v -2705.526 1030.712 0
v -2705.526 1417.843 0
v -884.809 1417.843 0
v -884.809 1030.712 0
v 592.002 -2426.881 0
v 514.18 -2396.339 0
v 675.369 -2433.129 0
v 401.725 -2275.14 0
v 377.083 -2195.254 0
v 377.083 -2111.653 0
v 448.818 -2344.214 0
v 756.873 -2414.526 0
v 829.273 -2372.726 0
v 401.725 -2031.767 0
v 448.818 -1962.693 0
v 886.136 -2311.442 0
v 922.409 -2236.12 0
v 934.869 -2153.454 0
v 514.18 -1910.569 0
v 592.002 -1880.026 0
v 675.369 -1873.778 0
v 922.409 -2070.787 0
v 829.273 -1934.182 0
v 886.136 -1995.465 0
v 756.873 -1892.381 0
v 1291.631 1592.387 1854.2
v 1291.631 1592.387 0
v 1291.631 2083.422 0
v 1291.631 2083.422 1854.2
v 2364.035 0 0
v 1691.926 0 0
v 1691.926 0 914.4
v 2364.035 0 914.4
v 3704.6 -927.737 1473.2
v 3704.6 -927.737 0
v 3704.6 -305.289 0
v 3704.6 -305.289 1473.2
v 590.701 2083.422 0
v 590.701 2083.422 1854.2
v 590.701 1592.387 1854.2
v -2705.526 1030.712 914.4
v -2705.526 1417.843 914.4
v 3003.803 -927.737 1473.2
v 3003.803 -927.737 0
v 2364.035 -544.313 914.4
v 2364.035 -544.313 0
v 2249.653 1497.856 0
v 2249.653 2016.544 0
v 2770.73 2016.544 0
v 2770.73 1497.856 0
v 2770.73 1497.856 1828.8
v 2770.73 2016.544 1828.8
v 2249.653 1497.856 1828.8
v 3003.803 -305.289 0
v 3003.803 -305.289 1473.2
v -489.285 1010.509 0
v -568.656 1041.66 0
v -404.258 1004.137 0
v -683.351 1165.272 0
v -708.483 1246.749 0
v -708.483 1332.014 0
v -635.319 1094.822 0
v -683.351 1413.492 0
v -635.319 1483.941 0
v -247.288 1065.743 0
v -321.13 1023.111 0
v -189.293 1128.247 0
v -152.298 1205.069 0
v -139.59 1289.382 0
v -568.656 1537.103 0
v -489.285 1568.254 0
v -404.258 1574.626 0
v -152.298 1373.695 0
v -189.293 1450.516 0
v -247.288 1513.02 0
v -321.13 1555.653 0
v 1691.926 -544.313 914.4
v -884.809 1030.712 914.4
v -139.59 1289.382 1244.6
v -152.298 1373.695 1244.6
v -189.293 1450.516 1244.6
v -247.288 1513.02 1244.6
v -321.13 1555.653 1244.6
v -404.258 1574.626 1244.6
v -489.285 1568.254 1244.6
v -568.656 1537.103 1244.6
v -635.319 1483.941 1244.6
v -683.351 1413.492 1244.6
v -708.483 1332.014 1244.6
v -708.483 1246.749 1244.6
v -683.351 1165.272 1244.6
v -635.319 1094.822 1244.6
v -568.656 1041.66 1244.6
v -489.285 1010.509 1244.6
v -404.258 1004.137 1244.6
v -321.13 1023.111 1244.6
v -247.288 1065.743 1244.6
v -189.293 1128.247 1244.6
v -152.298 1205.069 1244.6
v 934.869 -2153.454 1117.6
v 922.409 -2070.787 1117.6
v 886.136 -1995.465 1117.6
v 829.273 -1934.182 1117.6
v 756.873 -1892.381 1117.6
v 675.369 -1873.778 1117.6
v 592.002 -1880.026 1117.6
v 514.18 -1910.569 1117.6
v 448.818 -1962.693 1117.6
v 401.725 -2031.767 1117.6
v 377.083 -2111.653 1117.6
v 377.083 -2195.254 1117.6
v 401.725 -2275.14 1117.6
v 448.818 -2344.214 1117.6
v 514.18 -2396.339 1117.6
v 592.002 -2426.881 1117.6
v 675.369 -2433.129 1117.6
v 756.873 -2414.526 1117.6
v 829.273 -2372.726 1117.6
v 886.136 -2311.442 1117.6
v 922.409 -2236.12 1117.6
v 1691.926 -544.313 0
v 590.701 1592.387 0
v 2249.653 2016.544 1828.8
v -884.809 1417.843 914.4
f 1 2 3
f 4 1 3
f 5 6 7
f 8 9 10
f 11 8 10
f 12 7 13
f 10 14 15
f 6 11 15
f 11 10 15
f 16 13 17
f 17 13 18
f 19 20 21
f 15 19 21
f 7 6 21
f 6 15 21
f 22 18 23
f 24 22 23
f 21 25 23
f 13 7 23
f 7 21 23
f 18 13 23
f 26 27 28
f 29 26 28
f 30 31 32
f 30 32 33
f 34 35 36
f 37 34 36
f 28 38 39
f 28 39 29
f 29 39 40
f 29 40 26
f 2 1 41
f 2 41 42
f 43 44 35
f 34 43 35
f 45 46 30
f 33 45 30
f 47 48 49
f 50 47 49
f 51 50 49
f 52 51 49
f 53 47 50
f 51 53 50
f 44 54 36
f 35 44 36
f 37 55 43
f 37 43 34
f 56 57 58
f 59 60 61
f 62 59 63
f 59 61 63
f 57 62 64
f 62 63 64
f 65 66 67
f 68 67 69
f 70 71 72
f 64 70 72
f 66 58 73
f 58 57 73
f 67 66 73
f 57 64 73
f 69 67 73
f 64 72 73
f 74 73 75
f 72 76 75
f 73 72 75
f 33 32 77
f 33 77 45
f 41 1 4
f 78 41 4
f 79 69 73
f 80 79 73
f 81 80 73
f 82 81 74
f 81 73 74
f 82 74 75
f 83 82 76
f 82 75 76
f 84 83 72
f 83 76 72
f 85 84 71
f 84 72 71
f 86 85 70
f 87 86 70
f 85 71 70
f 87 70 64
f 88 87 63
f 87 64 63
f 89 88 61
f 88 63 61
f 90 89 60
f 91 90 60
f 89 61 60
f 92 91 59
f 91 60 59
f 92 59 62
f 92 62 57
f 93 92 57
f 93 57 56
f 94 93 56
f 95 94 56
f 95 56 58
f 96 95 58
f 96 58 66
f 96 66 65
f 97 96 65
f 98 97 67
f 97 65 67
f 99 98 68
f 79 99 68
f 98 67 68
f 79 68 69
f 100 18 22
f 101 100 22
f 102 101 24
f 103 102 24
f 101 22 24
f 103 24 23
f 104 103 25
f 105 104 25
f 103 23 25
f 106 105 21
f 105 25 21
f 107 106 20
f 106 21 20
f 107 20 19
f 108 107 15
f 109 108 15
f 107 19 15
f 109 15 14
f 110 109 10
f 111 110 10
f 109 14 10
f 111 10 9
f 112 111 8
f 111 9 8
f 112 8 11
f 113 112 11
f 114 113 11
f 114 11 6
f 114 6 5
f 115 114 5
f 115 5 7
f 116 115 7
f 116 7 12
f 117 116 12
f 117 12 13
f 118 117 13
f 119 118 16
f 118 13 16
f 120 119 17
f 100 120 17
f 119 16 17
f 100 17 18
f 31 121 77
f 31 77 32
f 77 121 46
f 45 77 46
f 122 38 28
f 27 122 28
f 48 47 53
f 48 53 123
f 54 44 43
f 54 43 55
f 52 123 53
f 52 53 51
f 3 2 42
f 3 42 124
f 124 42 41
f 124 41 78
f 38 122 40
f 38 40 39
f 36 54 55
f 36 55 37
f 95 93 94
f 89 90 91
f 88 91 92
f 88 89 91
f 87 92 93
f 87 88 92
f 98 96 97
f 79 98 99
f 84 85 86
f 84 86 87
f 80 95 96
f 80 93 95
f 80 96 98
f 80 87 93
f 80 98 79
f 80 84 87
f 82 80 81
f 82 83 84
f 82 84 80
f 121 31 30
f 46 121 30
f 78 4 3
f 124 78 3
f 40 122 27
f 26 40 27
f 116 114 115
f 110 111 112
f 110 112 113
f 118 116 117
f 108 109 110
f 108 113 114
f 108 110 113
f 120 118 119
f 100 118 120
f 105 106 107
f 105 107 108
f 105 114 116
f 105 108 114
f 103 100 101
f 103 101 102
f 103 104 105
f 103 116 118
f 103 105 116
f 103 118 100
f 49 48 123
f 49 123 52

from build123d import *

# Parameters (mm, degrees)
F0_W      = 919.162988
F0_H      = 539.31427
F1_DEPTH  = 25.4
F2_W      = 700.929463
F2_H      = 491.035104
F3_DEPTH  = 1854.2
F5_W      = 672.109008
F5_H      = 544.313073
F6_DEPTH  = 914.4
F7_R      = 178.740434
F8_DEPTH  = 939.8
F9_W      = 521.076918
F9_H      = 518.687129
F10_DEPTH = 1828.8
F11_W     = 700.797558
F11_H     = 622.448236
F12_DEPTH = 1473.2
F13_R     = 135.460143
F14_DEPTH = 1016
F15_R     = 280.459431
F16_DEPTH = 1117.6
F19_R     = 286.044111
F20_DEPTH = 1244.6
F21_W     = 1820.716203
F21_H     = 387.130737
F22_DEPTH = 914.4


with BuildPart() as f1:
    # F0 (on Top) → F1 (new body)
    with BuildSketch(Plane.XY):
        with Locations((2285.994172, -360.533297)):
            Rectangle(F0_W, F0_H)
    extrude(amount=F1_DEPTH)


with BuildPart() as f3:
    # F2 (on Top) → F3 (new body)
    with BuildSketch(Plane.XY):
        with Locations((941.166133, 1837.904632)):
            Rectangle(F2_W, F2_H)
    extrude(amount=F3_DEPTH)


with BuildPart() as f6:
    # F5 (on Top) → F6 (new body)
    with BuildSketch(Plane.XY):
        with Locations((2027.980149, -272.156537)):
            Rectangle(F5_W, F5_H)
    extrude(amount=F6_DEPTH)


with BuildPart() as f8:
    # F7 (on Top) → F8 (new body)
    with BuildSketch(Plane.XY):
        with Locations((-395.410061, 1610.258222)):
            Circle(F7_R)
    extrude(amount=F8_DEPTH)


with BuildPart() as f10:
    # F9 (on Top) → F10 (new body)
    with BuildSketch(Plane.XY):
        with Locations((2510.191083, 1757.200063)):
            Rectangle(F9_W, F9_H)
    extrude(amount=F10_DEPTH)


with BuildPart() as f12:
    # F11 (on Top) → F12 (new body)
    with BuildSketch(Plane.XY):
        with Locations((3354.201317, -616.512641)):
            Rectangle(F11_W, F11_H)
    extrude(amount=F12_DEPTH)


with BuildPart() as f14:
    # F13 (on Top) → F14 (new body)
    with BuildSketch(Plane.XY):
        with Locations((-951.282263, -655.183971)):
            Circle(F13_R)
    extrude(amount=F14_DEPTH)


with BuildPart() as f16:
    # F15 (on Top) → F16 (new body)
    with BuildSketch(Plane.XY):
        with Locations((654.409766, -2153.453588)):
            Circle(F15_R)
    extrude(amount=F16_DEPTH)


with BuildPart() as f20:
    # F19 (on Top) → F20 (new body)
    with BuildSketch(Plane.XY):
        with Locations((-425.633818, 1289.381742)):
            Circle(F19_R)
    extrude(amount=F20_DEPTH)


with BuildPart() as f22:
    # F21 (on Top) → F22 (new body)
    with BuildSketch(Plane.XY):
        with Locations((-1795.167535, 1224.277138)):
            Rectangle(F21_W, F21_H)
    extrude(amount=F22_DEPTH)


solid = Compound([f3.part, f6.part, f10.part, f12.part, f16.part, f20.part, f22.part])
